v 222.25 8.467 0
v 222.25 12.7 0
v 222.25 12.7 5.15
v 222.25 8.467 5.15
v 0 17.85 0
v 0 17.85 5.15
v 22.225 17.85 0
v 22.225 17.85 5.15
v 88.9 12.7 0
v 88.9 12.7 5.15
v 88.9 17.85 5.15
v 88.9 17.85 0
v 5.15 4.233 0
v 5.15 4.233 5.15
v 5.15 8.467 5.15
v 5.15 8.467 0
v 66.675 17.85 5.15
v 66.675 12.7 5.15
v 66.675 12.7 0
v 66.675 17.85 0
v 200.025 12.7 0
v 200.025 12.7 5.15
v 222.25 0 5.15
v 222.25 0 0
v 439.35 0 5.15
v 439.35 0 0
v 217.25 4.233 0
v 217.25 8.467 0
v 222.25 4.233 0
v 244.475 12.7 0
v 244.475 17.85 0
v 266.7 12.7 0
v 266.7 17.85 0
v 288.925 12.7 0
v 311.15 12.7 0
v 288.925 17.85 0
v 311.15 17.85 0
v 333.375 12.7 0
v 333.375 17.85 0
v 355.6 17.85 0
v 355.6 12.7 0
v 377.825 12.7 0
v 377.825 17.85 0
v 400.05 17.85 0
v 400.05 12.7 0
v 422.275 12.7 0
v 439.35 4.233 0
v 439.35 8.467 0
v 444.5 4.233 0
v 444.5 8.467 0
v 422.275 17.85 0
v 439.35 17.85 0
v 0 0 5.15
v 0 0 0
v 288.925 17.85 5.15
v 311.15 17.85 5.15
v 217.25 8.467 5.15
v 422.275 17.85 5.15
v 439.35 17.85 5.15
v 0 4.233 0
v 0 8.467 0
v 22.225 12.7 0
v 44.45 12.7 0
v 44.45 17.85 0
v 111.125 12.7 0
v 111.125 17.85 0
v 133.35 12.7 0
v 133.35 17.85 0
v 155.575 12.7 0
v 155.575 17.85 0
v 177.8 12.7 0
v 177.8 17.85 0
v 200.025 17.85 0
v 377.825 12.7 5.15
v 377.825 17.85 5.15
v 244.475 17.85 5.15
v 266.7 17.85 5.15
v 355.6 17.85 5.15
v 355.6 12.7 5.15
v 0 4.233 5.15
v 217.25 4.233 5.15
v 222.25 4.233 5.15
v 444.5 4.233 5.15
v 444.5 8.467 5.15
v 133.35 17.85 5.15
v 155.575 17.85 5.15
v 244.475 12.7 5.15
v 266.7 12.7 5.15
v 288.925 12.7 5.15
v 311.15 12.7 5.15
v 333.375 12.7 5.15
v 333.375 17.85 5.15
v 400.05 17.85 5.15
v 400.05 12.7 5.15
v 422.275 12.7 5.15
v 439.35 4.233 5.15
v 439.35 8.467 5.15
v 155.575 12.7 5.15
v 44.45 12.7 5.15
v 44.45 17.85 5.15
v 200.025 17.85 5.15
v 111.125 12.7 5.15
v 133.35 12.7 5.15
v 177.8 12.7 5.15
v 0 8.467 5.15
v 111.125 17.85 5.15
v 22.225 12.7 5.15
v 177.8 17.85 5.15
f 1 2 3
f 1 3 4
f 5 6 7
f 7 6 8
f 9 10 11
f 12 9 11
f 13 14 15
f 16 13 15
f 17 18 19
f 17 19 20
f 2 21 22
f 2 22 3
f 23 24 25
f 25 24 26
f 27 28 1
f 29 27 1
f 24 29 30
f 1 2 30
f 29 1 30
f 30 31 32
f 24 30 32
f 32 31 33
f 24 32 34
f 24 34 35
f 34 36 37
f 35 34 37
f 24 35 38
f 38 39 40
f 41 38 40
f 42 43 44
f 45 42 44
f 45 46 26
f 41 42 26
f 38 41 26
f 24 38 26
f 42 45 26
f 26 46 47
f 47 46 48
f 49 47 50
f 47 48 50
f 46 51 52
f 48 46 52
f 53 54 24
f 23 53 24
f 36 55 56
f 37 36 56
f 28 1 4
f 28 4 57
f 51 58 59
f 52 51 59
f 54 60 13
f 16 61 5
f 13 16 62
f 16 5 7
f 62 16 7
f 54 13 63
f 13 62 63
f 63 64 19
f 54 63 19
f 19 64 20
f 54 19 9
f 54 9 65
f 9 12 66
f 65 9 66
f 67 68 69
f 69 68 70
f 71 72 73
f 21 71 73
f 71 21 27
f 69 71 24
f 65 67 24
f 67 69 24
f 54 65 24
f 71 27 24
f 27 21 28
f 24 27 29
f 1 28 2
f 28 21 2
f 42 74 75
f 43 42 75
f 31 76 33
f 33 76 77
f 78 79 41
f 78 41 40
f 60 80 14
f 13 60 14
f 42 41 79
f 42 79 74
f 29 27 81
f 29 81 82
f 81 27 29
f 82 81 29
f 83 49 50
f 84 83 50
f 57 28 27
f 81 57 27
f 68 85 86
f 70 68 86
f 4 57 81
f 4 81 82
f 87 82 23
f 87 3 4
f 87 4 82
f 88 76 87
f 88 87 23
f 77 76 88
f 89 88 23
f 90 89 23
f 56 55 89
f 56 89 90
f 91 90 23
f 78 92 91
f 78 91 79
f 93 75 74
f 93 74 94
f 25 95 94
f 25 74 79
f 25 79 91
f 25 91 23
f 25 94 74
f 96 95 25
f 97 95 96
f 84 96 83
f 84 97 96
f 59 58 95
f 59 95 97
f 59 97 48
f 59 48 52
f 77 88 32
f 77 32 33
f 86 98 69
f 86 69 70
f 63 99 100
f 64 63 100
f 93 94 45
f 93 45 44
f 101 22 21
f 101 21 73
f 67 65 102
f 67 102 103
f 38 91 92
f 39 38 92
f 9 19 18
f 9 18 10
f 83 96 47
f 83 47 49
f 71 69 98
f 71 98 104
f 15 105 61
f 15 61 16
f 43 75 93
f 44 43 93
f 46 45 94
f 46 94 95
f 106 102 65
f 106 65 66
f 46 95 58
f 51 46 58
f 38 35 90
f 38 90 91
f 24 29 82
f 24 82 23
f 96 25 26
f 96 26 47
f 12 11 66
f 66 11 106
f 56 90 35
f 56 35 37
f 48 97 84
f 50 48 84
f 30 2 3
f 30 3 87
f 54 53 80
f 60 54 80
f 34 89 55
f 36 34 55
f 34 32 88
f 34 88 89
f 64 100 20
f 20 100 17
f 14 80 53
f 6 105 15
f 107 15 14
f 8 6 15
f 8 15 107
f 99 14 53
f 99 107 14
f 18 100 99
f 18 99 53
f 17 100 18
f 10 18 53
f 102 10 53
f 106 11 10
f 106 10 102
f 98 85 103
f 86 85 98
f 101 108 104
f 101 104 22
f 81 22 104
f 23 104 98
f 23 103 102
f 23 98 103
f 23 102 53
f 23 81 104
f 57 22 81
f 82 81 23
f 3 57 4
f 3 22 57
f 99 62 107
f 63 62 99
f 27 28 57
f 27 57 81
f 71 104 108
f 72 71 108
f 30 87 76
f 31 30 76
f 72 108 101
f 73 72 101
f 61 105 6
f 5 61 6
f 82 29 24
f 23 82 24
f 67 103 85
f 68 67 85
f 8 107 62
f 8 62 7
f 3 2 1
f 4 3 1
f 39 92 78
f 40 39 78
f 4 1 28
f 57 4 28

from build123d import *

# Parameters (mm, degrees)
SKETCH1_W              = 444.5
SKETCH1_H              = 12.7
BOSS_EXTRUDE1_DEPTH    = 5.15
SKETCH2_W              = 22.225
SKETCH2_H              = 5.15
BOSS_EXTRUDE2_DEPTH    = 5.15
SKETCH3_W              = 5.15
SKETCH3_H              = 4.233333334
SKETCH3_H_2            = 9.383333333
SKETCH3_H_3            = 4.233333333
CUT_EXTRUDE1_DEPTH     = 445.888070193
SPLIT1_SURFACE_1_BACK  = 445.888
SPLIT1_SURFACE_1_DEPTH = 891.776
SPLIT1_SURFACE_2_BACK  = 445.888
SPLIT1_SURFACE_2_DEPTH = 891.776


with BuildPart() as part:
    # Sketch1 → Boss-Extrude1 (new body)
    with BuildSketch(Plane.XY):
        with Locations((222.25, 6.35)):
            Rectangle(SKETCH1_W, SKETCH1_H)
    extrude(amount=BOSS_EXTRUDE1_DEPTH)

    # Sketch2 → Boss-Extrude2 (add)
    with BuildSketch(Plane.XY.offset(5.15)):
        with Locations((11.1125, 15.275)):
            Rectangle(SKETCH2_W, SKETCH2_H)
        with Locations((55.5625, 15.275)):
            Rectangle(SKETCH2_W, SKETCH2_H)
        with Locations((100.0125, 15.275)):
            Rectangle(SKETCH2_W, SKETCH2_H)
        with Locations((144.4625, 15.275)):
            Rectangle(SKETCH2_W, SKETCH2_H)
        with Locations((188.9125, 15.275)):
            Rectangle(SKETCH2_W, SKETCH2_H)
        with Locations((255.5875, 15.275)):
            Rectangle(SKETCH2_W, SKETCH2_H)
        with Locations((300.0375, 15.275)):
            Rectangle(SKETCH2_W, SKETCH2_H)
        with Locations((344.4875, 15.275)):
            Rectangle(SKETCH2_W, SKETCH2_H)
        with Locations((388.9375, 15.275)):
            Rectangle(SKETCH2_W, SKETCH2_H)
        with Locations((433.3875, 15.275)):
            Rectangle(SKETCH2_W, SKETCH2_H)
    extrude(amount=-BOSS_EXTRUDE2_DEPTH)

    # Sketch3 → Cut-Extrude1 (cut, through all)
    with BuildSketch(Plane.XY.offset(5.15)):
        with Locations((2.575, 6.35)):
            Rectangle(SKETCH3_W, SKETCH3_H)
        with Locations((441.925, 13.158333333)):
            Rectangle(SKETCH3_W, SKETCH3_H_2)
        with Locations((441.925, 2.116666667)):
            Rectangle(SKETCH3_W, SKETCH3_H_3)
    extrude(amount=-CUT_EXTRUDE1_DEPTH, mode=Mode.SUBTRACT)


with BuildPart() as body_2:
    # Split1: the piece behind the surface
    add(part.part)
    # Split1 surface: a surface, the sketch's curves swept straight by 891.776 mm
    with BuildLine(Plane.XY.offset(5.15).offset(-SPLIT1_SURFACE_1_BACK), mode=Mode.PRIVATE) as split1_surface_1_path:
        Line((222.25, 12.7), (222.25, 8.466666667))
        Line((222.25, 8.466666667), (217.25, 8.466666667))
        Line((217.25, 8.466666667), (217.25, 4.233333333))
        Line((217.25, 4.233333333), (222.25, 4.233333333))
        Line((222.25, 4.233333333), (222.25, 0))
    split1_surface_1 = Shell.extrude(split1_surface_1_path.wire(), (0 * SPLIT1_SURFACE_1_DEPTH, 0 * SPLIT1_SURFACE_1_DEPTH, 1 * SPLIT1_SURFACE_1_DEPTH))
    split(bisect_by=split1_surface_1, keep=Keep.BOTTOM)


with BuildPart() as part_1:
    add(part.part)

    # Split1: split by a surface, the side it looks to stays
    # Split1 surface: a surface, the sketch's curves swept straight by 891.776 mm
    with BuildLine(Plane.XY.offset(5.15).offset(-SPLIT1_SURFACE_2_BACK), mode=Mode.PRIVATE) as split1_surface_2_path:
        Line((222.25, 12.7), (222.25, 8.466666667))
        Line((222.25, 8.466666667), (217.25, 8.466666667))
        Line((217.25, 8.466666667), (217.25, 4.233333333))
        Line((217.25, 4.233333333), (222.25, 4.233333333))
        Line((222.25, 4.233333333), (222.25, 0))
    split1_surface_2 = Shell.extrude(split1_surface_2_path.wire(), (0 * SPLIT1_SURFACE_2_DEPTH, 0 * SPLIT1_SURFACE_2_DEPTH, 1 * SPLIT1_SURFACE_2_DEPTH))
    split(bisect_by=split1_surface_2, keep=Keep.TOP)


solid = Compound([body_2.part, part_1.part])
